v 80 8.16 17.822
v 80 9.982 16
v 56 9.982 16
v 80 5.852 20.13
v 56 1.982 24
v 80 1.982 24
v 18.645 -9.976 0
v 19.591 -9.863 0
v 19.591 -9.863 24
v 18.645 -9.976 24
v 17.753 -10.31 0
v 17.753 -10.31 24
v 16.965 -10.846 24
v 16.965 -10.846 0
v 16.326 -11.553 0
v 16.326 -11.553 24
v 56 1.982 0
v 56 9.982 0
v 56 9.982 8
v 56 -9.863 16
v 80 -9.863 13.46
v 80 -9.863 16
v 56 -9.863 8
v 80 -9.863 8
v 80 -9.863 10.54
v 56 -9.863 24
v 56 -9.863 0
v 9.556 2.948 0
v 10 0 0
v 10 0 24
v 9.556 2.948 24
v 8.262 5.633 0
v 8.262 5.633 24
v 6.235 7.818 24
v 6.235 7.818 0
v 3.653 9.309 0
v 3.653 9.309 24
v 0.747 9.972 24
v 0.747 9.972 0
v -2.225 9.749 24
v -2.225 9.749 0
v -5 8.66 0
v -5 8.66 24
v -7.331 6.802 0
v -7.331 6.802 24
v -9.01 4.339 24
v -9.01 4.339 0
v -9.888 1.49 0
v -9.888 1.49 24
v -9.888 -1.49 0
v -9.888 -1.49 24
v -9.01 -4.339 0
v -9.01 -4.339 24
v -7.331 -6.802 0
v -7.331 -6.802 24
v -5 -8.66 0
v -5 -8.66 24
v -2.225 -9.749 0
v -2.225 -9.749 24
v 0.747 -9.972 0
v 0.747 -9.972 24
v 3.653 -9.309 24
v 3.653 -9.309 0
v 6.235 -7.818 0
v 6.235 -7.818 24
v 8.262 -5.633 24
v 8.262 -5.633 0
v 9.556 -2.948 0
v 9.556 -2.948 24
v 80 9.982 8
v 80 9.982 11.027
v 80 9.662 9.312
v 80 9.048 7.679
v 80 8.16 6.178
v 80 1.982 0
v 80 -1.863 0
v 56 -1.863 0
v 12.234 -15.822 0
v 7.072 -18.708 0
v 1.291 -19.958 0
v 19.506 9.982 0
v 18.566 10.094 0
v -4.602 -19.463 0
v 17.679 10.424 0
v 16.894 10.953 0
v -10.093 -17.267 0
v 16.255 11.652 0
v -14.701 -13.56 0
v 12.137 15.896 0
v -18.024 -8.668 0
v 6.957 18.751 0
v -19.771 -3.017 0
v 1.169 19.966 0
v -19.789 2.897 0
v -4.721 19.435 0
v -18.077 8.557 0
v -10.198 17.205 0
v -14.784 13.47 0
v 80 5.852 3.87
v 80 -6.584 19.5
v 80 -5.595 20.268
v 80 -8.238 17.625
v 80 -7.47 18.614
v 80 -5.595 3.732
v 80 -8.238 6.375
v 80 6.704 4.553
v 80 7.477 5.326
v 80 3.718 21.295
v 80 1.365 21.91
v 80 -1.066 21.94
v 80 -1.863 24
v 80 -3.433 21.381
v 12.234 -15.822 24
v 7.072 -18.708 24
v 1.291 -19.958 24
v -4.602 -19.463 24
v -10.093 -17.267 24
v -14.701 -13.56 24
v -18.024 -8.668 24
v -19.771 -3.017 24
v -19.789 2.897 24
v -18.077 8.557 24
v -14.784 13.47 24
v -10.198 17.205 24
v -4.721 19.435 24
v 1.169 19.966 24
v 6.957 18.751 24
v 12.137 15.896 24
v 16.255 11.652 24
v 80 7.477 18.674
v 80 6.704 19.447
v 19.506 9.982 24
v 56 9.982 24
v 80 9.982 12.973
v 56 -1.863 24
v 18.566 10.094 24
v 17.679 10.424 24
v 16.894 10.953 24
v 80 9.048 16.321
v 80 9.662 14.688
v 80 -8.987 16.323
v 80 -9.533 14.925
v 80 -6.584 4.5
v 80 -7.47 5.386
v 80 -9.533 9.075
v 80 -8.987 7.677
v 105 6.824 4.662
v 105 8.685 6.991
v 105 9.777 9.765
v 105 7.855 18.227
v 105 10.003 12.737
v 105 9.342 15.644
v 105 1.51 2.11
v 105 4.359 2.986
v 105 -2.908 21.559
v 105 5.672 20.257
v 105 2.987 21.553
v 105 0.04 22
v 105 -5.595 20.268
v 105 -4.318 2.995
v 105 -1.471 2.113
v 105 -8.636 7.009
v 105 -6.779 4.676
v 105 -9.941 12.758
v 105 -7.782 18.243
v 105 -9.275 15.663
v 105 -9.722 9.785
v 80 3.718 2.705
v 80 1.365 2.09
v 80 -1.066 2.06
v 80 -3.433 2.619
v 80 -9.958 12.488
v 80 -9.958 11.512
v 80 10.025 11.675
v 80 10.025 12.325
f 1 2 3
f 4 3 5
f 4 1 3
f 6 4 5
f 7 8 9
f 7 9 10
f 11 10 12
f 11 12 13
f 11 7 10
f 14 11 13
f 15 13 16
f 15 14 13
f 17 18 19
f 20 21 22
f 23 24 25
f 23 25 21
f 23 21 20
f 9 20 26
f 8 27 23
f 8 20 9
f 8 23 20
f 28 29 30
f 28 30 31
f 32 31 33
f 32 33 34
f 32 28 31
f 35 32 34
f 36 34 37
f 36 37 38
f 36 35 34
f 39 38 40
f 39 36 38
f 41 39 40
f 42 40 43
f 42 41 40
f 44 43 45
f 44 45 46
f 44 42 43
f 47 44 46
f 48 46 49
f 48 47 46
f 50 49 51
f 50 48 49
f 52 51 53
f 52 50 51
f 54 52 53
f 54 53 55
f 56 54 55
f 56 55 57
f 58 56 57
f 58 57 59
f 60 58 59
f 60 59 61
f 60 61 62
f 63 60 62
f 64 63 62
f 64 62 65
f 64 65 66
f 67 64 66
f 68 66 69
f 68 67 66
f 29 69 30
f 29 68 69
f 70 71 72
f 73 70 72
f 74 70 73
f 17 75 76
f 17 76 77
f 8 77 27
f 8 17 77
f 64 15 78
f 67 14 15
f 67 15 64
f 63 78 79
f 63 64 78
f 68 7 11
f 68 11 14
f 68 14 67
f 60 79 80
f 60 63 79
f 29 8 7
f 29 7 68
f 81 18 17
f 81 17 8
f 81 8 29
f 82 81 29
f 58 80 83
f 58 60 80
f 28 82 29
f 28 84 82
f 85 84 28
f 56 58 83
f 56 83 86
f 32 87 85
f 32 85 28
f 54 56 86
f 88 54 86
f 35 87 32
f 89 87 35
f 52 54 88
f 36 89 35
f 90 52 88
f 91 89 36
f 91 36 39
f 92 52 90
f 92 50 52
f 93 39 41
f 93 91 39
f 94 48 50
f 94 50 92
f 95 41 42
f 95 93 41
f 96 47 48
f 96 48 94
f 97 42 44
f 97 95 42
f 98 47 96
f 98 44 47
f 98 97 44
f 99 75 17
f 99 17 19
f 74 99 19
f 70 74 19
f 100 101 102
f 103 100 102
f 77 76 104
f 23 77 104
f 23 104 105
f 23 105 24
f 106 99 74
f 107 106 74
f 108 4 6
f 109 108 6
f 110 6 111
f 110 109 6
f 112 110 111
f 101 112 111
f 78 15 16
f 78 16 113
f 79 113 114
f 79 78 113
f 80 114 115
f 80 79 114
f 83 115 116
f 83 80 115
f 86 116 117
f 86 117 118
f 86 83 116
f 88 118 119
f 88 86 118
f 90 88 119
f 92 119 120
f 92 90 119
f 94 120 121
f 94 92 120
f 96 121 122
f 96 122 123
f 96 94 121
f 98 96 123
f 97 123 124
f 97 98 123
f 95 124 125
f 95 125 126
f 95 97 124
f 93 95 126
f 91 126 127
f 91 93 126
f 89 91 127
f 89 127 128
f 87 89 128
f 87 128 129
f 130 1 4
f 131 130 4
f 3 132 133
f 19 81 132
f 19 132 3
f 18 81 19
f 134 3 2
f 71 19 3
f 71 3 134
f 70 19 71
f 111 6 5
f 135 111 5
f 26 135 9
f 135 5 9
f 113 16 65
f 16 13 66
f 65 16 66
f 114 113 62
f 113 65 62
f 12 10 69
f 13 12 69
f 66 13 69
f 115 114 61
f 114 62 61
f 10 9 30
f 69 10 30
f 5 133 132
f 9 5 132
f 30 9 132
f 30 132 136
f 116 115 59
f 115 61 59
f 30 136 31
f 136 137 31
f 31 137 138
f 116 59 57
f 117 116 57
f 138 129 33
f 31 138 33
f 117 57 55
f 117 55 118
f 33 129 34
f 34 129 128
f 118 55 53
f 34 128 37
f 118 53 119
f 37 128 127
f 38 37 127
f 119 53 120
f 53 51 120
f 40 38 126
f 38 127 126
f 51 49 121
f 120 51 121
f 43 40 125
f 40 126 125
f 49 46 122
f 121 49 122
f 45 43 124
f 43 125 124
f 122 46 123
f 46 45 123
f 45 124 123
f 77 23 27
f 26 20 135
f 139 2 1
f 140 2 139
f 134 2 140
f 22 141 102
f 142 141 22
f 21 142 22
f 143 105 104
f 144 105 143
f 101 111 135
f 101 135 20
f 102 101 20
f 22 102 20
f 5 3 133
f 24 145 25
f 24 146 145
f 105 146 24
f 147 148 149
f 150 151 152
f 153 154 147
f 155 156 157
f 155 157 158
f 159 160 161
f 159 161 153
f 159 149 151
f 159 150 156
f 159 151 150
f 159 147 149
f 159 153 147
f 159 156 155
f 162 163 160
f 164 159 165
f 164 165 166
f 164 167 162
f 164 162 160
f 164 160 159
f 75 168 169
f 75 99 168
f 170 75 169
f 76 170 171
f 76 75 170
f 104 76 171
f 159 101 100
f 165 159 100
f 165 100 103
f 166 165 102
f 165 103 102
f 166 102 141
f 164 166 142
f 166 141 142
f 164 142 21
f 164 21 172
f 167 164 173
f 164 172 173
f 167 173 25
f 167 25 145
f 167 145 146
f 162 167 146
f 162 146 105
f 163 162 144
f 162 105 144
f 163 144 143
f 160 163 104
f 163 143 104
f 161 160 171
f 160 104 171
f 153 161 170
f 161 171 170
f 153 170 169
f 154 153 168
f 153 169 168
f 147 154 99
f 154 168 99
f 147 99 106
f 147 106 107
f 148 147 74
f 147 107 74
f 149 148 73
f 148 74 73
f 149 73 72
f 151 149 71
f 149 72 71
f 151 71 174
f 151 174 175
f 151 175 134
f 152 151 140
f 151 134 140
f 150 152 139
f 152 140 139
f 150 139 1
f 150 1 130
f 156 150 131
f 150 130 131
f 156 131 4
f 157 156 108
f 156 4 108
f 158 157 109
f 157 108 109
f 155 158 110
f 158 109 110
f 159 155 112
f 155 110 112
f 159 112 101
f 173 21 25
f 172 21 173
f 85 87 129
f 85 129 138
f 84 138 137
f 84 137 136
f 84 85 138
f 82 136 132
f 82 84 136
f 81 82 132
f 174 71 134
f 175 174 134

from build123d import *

# Parameters (mm, degrees)
SKETCH1_R           = 10
BOSS_EXTRUDE4_DEPTH = 24
CUT_EXTRUDE1_DEPTH  = 24
SKETCH8_R           = 10
BOSS_EXTRUDE5_DEPTH = 25


with BuildPart() as part:
    # Sketch1 → Boss-Extrude4 (new body)
    with BuildSketch(Plane.XY):
        with BuildLine():
            Line((19.506185094, 9.982444102), (80, 9.982444102))
            Line((80, 9.982444102), (80, -9.863013699))
            Line((80, -9.863013699), (19.591244248, -9.863013699))
            ThreePointArc((19.591244248, -9.863013699), (17.753039843, -10.310408378), (16.326036873, -11.552511416))
            ThreePointArc((16.326036873, -11.552511416), (-19.99990669, -0.061093452), (16.255154245, 11.652036752))
            ThreePointArc((16.255154245, 11.652036752), (17.678841312, 10.424240243), (19.506185094, 9.982444102))
        make_face()
        Circle(SKETCH1_R, mode=Mode.SUBTRACT)
    extrude(amount=BOSS_EXTRUDE4_DEPTH)

    # Sketch7 → Cut-Extrude1 (cut)
    with BuildSketch(Plane(origin=(80, 0, 0), x_dir=(0, 0, -1), z_dir=(1, 0, 0))):
        Polygon((-8, 9.982444102), (0, 9.982444102), (0, 1.982444102), align=None)
        Polygon((-24, 9.982444102), (-16, 9.982444102), (-24, 1.982444102), align=None)
        Polygon((-24, -9.863013699), (-24, -1.863013699), (-16, -9.863013699), align=None)
        Polygon((0, -9.863013699), (0, -1.863013699), (-8, -9.863013699), align=None)
    extrude(amount=-CUT_EXTRUDE1_DEPTH, mode=Mode.SUBTRACT)

    # Sketch8 → Boss-Extrude5 (add)
    with BuildSketch(Plane(origin=(80, 0, 0), x_dir=(0, 0, -1), z_dir=(1, 0, 0))):
        with Locations(Location((-12, 0.029857601, 0), (0, 0, 214.226665148))):
            Circle(SKETCH8_R)
    extrude(amount=BOSS_EXTRUDE5_DEPTH)


solid = part.part
